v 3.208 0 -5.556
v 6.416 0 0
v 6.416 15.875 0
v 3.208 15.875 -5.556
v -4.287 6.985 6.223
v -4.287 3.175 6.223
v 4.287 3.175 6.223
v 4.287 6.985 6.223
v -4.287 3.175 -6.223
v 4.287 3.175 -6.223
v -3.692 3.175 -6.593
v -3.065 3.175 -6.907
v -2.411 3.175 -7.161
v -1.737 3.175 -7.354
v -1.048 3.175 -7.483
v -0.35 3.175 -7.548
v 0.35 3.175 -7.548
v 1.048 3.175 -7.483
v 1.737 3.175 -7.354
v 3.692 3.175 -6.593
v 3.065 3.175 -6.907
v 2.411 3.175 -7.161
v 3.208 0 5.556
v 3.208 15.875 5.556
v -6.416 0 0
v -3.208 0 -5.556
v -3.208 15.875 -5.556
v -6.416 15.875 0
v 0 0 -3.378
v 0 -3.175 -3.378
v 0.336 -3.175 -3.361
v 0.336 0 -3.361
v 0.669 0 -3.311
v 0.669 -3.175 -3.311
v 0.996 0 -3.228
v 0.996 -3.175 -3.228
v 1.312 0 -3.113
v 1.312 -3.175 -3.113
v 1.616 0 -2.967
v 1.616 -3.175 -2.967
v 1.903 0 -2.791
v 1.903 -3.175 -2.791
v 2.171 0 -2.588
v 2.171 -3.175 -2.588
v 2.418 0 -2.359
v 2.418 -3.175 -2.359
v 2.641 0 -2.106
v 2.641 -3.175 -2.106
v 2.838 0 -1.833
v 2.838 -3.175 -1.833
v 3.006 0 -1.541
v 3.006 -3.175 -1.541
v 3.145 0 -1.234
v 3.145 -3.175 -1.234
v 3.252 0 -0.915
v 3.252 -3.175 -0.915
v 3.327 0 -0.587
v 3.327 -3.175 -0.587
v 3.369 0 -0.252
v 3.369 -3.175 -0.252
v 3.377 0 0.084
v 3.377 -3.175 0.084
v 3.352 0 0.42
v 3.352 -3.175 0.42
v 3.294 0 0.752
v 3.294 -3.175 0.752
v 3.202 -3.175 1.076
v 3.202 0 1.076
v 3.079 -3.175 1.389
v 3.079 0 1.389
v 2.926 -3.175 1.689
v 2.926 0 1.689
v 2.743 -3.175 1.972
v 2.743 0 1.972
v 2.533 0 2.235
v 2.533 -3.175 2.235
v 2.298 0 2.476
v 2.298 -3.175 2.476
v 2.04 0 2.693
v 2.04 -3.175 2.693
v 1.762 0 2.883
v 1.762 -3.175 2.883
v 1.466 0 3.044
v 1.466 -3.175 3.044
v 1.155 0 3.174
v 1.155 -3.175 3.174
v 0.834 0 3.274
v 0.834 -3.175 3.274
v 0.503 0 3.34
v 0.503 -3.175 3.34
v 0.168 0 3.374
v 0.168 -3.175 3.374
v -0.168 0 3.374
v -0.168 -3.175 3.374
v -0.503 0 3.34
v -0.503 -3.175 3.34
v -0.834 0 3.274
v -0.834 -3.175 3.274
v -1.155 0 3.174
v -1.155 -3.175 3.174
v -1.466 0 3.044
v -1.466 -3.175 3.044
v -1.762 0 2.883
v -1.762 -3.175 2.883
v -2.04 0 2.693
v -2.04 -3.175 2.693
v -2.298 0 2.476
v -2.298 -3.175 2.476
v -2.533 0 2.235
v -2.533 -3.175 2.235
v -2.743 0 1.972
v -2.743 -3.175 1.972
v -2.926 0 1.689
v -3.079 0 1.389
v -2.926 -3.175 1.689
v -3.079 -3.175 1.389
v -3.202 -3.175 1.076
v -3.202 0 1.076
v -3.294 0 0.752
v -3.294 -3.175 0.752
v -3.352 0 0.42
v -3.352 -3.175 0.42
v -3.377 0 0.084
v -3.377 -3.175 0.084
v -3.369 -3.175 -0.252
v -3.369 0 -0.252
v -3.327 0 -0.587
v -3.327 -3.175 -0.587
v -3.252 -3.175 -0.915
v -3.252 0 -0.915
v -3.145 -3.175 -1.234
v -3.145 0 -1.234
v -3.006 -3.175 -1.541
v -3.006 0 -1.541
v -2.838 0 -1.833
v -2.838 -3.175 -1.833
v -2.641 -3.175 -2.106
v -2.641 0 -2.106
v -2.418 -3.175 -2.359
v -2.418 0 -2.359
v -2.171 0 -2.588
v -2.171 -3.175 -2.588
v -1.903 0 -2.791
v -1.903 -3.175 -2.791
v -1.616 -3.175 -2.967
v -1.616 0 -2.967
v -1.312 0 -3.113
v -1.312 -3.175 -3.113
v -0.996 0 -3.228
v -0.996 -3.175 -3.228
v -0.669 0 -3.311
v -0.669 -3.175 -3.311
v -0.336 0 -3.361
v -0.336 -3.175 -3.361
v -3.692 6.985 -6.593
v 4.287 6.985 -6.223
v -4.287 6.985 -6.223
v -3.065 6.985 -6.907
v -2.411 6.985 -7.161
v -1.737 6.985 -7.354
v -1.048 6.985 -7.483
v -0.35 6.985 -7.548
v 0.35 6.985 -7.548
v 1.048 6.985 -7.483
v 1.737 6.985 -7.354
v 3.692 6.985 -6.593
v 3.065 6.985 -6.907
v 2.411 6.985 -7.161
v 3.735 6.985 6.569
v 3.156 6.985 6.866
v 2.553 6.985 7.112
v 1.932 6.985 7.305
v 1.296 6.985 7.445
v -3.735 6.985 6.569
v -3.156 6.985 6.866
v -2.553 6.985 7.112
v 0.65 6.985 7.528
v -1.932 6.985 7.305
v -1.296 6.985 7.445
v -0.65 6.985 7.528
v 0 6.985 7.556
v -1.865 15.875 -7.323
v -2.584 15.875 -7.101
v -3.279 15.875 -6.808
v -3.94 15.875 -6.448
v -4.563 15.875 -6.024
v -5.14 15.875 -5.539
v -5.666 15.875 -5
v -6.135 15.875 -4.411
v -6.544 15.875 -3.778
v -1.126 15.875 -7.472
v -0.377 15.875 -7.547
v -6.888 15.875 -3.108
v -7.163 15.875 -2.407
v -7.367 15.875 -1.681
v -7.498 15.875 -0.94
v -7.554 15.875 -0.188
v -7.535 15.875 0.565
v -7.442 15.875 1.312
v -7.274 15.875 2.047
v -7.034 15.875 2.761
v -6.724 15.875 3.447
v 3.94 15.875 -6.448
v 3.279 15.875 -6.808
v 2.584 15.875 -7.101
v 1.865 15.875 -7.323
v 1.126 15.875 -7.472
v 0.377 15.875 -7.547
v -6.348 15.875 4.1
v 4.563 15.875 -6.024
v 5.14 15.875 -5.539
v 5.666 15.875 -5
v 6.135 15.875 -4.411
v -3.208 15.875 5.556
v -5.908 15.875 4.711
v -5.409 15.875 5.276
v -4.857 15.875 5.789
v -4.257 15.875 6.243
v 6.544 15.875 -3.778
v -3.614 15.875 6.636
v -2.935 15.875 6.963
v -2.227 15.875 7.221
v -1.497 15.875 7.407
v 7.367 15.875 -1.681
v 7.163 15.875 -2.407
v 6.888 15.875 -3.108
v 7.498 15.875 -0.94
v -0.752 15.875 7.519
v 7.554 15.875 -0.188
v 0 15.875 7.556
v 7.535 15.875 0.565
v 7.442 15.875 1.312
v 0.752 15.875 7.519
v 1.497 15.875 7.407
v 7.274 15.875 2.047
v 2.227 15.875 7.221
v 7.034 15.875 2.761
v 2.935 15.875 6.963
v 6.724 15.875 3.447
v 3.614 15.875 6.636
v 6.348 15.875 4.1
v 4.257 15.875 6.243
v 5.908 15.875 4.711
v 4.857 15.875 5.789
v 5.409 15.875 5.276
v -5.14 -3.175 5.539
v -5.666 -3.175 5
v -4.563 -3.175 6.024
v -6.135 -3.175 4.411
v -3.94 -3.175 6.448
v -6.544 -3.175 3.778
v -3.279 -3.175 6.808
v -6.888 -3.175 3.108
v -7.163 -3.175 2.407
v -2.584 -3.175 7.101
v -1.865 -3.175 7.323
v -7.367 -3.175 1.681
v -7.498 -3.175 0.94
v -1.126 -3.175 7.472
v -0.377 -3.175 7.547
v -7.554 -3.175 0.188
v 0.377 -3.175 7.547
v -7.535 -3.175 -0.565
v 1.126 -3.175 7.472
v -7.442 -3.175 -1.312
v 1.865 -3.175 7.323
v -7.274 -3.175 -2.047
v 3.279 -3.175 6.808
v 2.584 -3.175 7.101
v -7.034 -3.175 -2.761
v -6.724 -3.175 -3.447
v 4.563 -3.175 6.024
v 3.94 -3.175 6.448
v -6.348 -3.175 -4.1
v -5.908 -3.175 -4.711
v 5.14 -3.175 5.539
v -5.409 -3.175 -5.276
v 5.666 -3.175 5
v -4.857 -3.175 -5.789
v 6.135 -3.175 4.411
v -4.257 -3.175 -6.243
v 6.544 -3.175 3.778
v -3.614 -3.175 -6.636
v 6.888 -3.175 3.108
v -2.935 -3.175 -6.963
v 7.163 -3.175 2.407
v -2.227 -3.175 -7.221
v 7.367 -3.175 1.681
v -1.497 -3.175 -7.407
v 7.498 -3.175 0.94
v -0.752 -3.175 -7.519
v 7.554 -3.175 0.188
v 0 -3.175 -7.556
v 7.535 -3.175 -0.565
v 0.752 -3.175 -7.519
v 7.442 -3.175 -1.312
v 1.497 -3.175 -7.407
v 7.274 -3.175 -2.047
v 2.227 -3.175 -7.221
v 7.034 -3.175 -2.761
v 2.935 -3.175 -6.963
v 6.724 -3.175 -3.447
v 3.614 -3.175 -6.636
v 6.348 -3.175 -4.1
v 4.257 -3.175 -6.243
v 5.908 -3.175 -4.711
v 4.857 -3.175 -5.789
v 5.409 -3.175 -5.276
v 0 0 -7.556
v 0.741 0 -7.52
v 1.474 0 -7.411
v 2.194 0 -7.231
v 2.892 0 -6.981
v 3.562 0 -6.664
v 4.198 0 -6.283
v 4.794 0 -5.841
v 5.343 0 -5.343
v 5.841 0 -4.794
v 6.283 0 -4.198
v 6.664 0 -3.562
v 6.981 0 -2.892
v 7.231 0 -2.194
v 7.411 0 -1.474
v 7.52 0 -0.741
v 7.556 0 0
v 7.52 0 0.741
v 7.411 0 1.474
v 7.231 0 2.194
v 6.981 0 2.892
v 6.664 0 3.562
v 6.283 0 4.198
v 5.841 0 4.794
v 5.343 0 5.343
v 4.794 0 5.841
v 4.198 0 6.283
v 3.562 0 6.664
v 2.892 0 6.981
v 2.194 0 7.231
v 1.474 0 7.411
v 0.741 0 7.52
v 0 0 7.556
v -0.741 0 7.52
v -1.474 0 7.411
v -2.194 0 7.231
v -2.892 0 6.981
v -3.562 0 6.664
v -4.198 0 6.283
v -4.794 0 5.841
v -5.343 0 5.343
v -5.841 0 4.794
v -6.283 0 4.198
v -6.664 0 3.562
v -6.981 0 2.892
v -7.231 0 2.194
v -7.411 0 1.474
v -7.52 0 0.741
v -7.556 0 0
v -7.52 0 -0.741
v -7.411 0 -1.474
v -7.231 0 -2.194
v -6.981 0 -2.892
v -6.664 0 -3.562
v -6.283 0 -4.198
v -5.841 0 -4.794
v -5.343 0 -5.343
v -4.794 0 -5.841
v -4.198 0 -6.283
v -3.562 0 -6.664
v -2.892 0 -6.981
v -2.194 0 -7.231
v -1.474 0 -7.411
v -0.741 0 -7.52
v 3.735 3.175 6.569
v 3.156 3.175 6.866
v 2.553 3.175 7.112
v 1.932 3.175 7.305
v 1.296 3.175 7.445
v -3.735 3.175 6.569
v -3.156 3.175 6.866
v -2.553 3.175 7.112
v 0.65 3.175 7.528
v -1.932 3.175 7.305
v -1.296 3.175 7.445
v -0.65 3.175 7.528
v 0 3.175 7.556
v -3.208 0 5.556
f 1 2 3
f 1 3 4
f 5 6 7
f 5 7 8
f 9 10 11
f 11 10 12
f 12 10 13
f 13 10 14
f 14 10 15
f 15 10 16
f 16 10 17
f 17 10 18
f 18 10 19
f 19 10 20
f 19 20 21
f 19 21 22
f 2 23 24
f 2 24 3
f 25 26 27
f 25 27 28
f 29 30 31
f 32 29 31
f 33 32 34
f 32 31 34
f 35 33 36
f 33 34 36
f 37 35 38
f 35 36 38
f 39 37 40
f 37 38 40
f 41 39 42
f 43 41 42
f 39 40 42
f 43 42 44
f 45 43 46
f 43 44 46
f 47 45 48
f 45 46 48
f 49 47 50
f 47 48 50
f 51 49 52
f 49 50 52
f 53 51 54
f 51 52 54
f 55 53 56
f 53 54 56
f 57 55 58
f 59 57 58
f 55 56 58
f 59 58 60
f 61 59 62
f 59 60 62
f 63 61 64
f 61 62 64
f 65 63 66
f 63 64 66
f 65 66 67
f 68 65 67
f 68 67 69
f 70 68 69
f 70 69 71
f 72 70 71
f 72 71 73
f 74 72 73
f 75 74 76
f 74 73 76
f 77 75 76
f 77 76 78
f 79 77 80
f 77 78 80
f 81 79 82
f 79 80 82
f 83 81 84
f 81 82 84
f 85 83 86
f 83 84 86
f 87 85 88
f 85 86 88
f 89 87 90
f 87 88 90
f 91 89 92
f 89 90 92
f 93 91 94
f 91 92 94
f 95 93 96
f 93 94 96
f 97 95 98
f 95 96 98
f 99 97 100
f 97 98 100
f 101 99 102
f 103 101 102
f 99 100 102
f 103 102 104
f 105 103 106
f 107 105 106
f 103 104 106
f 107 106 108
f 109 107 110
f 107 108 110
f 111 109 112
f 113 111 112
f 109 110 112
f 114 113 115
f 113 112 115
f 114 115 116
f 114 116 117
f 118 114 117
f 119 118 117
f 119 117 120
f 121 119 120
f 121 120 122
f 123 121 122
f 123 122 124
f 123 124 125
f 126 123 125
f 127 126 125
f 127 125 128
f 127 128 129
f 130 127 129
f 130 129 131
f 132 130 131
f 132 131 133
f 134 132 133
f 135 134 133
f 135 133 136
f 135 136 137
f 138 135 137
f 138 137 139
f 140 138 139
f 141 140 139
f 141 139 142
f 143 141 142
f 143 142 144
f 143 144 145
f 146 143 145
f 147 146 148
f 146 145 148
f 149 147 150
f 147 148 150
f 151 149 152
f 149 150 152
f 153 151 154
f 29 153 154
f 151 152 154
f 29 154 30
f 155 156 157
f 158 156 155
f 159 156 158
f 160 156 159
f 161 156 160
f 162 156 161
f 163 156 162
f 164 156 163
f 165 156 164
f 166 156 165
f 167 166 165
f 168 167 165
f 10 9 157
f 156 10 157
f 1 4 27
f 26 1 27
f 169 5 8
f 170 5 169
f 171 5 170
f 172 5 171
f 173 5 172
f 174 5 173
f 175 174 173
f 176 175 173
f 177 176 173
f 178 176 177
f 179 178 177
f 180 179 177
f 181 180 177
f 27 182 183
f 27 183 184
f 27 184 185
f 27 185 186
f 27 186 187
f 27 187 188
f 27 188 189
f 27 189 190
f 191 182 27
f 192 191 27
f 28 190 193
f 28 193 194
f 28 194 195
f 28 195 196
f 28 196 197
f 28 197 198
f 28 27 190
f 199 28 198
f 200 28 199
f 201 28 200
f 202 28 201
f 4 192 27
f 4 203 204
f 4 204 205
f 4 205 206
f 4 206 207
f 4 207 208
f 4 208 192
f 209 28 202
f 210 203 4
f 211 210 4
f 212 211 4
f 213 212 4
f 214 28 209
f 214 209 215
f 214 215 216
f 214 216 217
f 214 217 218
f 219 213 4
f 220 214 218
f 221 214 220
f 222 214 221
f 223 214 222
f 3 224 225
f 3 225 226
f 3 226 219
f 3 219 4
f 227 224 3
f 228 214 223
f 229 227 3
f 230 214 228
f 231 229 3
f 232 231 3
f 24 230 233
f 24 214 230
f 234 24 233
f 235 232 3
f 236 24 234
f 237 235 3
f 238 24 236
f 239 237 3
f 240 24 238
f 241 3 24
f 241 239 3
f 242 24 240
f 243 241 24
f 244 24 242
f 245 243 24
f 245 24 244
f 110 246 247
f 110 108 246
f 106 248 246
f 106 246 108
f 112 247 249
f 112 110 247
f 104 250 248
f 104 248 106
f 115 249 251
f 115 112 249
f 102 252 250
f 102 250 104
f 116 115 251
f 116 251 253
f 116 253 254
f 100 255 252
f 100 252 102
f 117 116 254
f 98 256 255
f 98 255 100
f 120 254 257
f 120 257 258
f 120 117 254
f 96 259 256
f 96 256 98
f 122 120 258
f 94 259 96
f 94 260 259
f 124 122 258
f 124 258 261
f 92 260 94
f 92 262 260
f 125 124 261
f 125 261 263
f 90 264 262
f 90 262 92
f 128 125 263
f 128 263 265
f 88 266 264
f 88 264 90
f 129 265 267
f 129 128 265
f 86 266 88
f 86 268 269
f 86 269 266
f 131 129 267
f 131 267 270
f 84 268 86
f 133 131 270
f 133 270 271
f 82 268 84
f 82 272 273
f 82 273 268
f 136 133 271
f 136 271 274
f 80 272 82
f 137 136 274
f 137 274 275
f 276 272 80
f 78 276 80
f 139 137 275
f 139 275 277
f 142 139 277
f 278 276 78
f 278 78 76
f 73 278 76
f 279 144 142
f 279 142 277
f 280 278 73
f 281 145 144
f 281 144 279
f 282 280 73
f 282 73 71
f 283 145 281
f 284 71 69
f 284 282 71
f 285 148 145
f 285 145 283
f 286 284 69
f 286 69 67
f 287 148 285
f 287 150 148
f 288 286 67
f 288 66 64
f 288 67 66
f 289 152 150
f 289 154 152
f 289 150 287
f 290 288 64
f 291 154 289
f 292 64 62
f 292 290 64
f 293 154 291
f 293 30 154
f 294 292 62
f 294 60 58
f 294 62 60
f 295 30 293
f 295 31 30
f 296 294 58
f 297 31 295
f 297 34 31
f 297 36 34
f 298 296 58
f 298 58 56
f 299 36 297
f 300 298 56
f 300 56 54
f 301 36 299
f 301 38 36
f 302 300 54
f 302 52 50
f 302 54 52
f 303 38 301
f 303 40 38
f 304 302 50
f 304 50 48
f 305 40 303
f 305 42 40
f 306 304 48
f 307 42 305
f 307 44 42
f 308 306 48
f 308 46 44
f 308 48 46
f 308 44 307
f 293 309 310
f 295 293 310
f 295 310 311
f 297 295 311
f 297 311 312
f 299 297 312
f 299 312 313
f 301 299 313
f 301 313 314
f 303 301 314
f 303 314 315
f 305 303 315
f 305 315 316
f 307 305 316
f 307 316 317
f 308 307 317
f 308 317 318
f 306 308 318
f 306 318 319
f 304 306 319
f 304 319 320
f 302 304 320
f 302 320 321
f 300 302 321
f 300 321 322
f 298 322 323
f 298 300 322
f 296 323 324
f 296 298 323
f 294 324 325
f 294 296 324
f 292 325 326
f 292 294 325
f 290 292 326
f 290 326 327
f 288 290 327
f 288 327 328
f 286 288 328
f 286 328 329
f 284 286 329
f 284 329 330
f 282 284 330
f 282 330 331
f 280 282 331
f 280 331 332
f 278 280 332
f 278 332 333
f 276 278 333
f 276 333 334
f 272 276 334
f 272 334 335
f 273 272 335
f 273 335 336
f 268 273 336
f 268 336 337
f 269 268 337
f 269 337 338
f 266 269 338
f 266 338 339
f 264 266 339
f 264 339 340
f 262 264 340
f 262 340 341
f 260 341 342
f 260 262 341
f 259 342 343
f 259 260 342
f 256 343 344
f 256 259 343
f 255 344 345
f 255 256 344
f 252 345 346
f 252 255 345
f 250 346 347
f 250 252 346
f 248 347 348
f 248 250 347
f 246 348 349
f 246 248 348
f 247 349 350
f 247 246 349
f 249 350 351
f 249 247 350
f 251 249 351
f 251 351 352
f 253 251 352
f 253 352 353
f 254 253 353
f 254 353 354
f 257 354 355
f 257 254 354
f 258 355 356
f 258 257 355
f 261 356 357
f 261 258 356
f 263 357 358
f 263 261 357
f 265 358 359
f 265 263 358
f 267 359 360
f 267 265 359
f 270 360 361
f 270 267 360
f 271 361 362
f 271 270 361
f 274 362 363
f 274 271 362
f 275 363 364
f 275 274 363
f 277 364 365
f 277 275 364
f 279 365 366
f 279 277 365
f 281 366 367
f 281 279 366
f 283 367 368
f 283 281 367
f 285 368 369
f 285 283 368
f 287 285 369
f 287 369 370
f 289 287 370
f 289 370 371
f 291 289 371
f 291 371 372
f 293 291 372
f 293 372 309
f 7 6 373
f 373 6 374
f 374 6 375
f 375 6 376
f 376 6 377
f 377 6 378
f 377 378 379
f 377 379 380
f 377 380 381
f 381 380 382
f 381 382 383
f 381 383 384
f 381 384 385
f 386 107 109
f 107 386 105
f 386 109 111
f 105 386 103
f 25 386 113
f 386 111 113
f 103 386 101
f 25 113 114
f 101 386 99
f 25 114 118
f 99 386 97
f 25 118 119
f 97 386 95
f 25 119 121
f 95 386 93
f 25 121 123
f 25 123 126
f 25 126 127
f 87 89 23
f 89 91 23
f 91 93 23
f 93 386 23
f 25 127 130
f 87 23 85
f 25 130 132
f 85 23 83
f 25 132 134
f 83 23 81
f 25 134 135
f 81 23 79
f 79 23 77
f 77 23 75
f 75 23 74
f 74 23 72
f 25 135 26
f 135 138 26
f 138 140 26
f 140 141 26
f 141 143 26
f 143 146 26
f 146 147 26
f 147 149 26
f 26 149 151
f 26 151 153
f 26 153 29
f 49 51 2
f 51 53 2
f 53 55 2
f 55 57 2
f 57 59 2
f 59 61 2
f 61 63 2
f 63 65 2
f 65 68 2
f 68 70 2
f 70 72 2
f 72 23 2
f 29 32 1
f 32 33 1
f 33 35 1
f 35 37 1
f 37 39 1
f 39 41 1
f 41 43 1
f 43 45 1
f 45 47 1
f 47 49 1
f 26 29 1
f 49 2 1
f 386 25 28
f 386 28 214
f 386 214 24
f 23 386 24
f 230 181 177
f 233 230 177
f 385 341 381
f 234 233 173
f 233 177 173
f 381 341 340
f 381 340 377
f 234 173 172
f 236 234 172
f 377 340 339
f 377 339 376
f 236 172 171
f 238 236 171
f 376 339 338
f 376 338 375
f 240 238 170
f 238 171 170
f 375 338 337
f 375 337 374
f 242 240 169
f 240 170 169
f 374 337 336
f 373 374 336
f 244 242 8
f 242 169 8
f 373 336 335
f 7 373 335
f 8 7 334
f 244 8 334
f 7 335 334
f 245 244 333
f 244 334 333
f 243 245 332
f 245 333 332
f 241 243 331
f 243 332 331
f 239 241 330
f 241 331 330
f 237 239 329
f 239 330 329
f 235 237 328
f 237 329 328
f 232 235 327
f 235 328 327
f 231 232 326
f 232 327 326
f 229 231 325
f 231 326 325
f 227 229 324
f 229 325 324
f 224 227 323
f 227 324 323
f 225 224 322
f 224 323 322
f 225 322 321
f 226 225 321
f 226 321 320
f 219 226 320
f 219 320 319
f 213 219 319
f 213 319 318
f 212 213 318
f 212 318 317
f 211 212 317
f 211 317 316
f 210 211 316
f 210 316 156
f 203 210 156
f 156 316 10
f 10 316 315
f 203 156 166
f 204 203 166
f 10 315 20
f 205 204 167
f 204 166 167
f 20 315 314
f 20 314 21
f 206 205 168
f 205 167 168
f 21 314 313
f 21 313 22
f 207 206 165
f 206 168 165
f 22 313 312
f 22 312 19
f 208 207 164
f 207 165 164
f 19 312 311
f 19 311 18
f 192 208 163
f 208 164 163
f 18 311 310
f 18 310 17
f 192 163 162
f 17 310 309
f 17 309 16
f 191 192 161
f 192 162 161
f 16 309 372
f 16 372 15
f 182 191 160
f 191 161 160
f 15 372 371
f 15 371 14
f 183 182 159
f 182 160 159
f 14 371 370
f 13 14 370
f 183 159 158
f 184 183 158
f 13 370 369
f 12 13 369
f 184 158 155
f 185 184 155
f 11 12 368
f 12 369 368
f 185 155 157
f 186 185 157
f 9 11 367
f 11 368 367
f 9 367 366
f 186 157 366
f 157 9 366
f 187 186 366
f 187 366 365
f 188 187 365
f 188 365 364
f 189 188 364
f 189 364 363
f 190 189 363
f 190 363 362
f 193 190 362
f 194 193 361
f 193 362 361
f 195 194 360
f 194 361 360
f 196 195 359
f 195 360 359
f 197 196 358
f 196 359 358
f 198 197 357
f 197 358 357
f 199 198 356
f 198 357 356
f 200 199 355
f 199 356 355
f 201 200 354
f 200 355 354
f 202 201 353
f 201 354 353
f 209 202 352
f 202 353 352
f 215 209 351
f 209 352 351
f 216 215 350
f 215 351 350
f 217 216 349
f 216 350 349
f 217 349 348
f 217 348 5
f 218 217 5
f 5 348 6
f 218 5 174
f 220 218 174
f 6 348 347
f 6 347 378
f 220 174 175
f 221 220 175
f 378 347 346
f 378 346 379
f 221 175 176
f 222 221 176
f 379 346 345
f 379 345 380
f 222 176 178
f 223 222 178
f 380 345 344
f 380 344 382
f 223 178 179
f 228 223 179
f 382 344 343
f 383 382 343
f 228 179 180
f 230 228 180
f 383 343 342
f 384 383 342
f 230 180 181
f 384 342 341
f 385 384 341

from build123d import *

# Parameters (mm, degrees)
SKETCH1_R               = 7.5565
BOSS_EXTRUDE1_DEPTH     = 15.875
BOSS_EXTRUDE2_START     = 3.175
SKETCH2_R               = 7.5565
SKETCH2_R_2             = 3.3782
BOSS_EXTRUDE2_DEPTH     = 3.175
CUT_EXTRUDE1_DEPTH      = 20.136797263
CUT_EXTRUDE1_DEPTH_BACK = 20.136797263
SKETCH3_W               = 1.979009817
SKETCH3_H               = 3.81
SKETCH3_W_2             = 2.256055482


with BuildPart() as part:
    # Sketch1 → Boss-Extrude1 (new body)
    with BuildSketch(Plane(origin=(0, 0, 0), x_dir=(1, 0, 0), z_dir=(0, 1, 0))):
        with Locations(Location((0, 0, 0), (0, 0, 270))):
            Circle(SKETCH1_R)
        Polygon((-3.207902433, 5.55625), (-6.415804866, 0), (-3.207902433, -5.55625), (3.207902433, -5.55625), (6.415804866, 0), (3.207902433, 5.55625), align=None, mode=Mode.SUBTRACT)
    extrude(amount=BOSS_EXTRUDE1_DEPTH)

    # Sketch2 → Boss-Extrude2 (add)
    with BuildSketch(Plane.XZ.offset(BOSS_EXTRUDE2_START)):
        with Locations(Location((0, 0, 0), (0, 0, 270))):
            Circle(SKETCH2_R)
        with Locations(Location((0, 0, 0), (0, 0, 270))):
            Circle(SKETCH2_R_2, mode=Mode.SUBTRACT)
    extrude(amount=-BOSS_EXTRUDE2_DEPTH)

    # Sketch3 → Cut-Extrude1 (cut, two sides: drawn at the far end of the back side and taken through both)
    with BuildSketch(Plane(origin=(0, 0, 0), x_dir=(0, 0, -1), z_dir=(1, 0, 0)).offset(-CUT_EXTRUDE1_DEPTH_BACK)):
        with Locations((-7.212504909, 5.08)):
            Rectangle(SKETCH3_W, SKETCH3_H)
        with Locations((7.351027741, 5.08)):
            Rectangle(SKETCH3_W_2, SKETCH3_H)
    extrude(amount=CUT_EXTRUDE1_DEPTH + CUT_EXTRUDE1_DEPTH_BACK, mode=Mode.SUBTRACT)


solid = part.part
